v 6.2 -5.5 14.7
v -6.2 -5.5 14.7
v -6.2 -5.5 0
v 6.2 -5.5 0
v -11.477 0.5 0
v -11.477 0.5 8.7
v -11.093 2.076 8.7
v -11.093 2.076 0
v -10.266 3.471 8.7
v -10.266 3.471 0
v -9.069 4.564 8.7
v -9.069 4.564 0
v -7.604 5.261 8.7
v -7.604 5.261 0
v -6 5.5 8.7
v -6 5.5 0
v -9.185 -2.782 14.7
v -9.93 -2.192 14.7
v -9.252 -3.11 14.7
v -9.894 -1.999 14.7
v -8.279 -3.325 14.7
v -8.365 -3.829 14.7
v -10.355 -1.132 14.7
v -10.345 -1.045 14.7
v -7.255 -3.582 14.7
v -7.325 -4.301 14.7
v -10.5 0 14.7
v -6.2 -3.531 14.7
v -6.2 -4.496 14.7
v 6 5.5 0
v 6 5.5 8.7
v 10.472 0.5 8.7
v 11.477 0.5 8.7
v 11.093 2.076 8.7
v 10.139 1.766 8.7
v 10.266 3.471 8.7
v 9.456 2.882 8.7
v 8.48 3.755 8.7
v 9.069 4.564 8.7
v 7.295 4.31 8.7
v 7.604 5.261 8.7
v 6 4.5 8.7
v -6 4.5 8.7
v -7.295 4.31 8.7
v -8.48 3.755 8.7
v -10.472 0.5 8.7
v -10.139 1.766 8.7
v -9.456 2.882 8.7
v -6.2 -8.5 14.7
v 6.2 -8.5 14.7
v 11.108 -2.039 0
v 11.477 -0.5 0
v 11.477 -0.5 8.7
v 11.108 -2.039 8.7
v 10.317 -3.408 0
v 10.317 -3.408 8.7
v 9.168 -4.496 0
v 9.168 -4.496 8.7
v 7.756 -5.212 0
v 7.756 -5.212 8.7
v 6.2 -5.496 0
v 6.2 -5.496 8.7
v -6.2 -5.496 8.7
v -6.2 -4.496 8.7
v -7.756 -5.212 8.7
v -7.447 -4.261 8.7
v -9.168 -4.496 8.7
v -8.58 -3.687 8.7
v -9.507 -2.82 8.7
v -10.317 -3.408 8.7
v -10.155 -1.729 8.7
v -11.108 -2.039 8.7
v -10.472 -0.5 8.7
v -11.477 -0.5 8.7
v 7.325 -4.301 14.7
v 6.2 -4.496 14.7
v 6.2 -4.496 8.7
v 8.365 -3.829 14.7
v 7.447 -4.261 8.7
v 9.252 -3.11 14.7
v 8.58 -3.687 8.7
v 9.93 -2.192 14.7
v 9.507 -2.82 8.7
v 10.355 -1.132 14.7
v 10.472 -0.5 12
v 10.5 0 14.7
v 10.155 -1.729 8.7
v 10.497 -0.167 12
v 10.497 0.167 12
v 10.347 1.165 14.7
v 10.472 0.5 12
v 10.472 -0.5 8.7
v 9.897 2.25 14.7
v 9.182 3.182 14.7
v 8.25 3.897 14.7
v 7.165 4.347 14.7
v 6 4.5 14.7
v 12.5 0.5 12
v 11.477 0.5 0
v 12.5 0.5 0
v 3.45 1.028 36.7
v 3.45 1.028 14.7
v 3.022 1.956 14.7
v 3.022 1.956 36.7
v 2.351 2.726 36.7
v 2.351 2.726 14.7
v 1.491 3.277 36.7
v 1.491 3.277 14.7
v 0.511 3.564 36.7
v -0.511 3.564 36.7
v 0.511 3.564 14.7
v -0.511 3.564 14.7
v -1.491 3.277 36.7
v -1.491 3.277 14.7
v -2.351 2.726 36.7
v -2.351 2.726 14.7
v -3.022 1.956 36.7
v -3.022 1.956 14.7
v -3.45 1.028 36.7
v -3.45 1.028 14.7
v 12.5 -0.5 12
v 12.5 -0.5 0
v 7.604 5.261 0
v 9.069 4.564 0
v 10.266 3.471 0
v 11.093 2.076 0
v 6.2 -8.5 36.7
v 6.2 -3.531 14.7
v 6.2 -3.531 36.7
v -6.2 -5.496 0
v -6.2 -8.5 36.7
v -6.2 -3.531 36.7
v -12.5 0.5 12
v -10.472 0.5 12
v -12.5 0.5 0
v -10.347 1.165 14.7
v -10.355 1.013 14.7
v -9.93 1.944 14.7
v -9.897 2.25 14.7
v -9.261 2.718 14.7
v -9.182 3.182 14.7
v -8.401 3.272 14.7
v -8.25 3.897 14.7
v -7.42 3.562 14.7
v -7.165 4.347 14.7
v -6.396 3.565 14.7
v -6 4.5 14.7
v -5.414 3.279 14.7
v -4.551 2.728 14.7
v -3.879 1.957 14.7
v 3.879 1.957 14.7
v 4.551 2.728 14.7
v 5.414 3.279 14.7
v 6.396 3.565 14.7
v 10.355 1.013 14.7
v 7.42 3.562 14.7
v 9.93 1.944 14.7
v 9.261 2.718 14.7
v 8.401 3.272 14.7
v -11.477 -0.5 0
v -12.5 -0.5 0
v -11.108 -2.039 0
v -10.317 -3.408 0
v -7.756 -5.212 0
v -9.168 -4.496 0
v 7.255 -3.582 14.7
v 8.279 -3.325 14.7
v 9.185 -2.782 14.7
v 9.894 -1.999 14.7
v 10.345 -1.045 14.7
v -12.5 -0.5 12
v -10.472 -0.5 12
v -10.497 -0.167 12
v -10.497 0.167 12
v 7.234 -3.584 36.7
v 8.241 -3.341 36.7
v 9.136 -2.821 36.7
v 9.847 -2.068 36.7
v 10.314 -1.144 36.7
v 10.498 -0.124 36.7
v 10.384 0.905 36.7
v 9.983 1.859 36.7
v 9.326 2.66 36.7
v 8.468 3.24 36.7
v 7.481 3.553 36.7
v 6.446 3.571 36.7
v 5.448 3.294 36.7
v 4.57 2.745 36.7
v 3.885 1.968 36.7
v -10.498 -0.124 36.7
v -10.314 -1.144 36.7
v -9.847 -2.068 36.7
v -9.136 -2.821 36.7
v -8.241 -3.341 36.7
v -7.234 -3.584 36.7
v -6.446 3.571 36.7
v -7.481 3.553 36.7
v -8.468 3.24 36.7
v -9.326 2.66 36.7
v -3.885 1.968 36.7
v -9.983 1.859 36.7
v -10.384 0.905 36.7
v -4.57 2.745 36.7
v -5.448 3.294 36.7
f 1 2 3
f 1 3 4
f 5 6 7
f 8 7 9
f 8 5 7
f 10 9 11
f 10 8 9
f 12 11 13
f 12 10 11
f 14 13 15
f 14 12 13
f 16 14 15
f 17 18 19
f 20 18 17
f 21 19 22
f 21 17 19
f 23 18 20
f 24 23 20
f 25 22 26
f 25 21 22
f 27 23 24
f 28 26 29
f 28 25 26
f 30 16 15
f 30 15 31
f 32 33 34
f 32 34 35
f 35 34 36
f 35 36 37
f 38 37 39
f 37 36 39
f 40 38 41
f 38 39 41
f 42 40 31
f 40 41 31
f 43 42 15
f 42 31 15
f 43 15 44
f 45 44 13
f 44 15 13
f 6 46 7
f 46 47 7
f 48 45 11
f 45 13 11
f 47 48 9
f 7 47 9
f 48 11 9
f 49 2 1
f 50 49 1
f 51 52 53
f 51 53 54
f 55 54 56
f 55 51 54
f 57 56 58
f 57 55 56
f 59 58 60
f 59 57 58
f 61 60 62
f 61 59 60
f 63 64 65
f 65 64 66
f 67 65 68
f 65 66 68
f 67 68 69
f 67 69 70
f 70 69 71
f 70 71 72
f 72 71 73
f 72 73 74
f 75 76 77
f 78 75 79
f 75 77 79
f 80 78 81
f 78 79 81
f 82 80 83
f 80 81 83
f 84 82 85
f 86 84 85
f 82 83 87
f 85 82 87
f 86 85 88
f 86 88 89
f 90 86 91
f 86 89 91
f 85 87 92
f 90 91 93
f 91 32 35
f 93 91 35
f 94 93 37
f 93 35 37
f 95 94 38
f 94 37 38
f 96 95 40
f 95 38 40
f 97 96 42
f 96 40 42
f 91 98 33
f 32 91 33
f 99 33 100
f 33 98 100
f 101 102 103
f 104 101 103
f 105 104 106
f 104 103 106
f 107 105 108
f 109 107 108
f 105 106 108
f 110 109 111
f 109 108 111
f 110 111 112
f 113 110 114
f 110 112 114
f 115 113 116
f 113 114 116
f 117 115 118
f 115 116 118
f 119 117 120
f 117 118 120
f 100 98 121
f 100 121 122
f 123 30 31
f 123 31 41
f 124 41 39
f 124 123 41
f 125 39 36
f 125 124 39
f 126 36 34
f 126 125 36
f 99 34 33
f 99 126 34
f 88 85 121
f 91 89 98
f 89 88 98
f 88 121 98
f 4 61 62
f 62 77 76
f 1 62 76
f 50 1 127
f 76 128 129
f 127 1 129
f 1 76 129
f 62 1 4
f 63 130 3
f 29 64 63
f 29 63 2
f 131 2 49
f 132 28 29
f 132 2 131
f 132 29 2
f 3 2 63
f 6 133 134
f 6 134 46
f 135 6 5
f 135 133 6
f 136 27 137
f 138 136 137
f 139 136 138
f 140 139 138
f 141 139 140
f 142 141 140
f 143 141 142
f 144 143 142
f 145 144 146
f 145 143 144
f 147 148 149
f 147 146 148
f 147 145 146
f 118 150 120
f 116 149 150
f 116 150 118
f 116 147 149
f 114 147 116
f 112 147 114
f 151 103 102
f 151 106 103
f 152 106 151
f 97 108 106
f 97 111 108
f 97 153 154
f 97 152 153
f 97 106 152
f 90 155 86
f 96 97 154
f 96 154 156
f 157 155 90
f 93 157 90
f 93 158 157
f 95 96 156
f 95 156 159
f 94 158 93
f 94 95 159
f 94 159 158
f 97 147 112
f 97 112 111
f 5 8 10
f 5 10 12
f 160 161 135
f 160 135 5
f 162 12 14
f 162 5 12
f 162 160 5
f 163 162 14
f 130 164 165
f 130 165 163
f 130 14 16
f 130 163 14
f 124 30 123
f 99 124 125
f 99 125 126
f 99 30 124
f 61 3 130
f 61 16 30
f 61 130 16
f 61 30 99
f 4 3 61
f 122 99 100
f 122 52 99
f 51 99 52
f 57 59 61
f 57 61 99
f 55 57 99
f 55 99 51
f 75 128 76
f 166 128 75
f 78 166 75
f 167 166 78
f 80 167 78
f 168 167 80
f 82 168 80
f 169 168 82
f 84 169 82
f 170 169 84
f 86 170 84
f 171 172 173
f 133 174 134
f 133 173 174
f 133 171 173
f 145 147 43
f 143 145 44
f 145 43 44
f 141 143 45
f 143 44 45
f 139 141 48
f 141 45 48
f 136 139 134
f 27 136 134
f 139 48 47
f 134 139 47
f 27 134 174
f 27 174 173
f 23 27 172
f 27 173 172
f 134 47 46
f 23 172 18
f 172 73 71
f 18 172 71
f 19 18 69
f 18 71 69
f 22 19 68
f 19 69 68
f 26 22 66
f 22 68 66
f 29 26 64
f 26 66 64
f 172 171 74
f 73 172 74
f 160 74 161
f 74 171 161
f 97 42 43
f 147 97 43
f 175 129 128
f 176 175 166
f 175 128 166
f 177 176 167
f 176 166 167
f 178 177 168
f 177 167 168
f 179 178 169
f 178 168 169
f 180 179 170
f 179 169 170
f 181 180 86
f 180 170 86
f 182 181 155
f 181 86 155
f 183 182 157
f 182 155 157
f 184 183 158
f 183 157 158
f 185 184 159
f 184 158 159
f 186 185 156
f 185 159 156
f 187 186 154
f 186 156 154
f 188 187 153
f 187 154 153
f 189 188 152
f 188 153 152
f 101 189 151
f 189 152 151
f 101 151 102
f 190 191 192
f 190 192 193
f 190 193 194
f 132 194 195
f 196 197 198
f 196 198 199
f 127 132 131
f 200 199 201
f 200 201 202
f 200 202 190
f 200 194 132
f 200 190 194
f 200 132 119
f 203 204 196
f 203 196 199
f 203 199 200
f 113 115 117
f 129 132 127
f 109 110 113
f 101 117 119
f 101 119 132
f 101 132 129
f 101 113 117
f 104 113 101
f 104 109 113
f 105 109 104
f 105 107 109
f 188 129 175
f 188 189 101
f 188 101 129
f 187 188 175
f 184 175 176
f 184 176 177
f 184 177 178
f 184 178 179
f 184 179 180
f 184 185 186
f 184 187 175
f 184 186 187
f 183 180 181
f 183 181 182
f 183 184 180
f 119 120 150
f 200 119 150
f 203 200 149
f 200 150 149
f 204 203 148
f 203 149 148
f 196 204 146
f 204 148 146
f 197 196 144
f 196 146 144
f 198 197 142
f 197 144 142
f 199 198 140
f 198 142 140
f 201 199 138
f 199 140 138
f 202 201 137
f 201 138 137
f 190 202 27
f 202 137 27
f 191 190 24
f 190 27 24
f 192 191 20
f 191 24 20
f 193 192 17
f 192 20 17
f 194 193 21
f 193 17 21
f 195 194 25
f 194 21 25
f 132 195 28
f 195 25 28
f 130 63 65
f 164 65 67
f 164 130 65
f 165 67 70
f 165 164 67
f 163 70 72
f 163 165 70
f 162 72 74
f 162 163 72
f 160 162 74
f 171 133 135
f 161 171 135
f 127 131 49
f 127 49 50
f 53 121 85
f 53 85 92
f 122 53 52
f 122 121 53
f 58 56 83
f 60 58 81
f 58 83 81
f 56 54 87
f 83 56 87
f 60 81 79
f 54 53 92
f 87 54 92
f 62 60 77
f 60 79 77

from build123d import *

# Parameters (mm, degrees)
EXTRUDE_1_DEPTH  = 8.7
EXTRUDE_2_DEPTH  = 6
EXTRUDE_7_DEPTH  = 22
EXTRUDE_15_REACH = 42.002
SKETCH_6_W       = 12.4
SKETCH_6_H       = 36.7
EXTRUDE_16_REACH = 46.194
SKETCH_10_W      = 12
SKETCH_10_H      = 1
SKETCH_11_W      = 12.4
SKETCH_11_H      = 22
EXTRUDE_17_DEPTH = 3


with BuildPart() as part:
    # ｽｹｯﾁ1 → ﾎﾞｽ - 押し出し1 (new body)
    with BuildSketch(Plane.XY):
        with BuildLine():
            Line((-6, 5.5), (6, 5.5))
            ThreePointArc((6, 5.5), (11.5, 0), (6, -5.5))
            Line((6, -5.5), (-6, -5.5))
            ThreePointArc((-6, -5.5), (-11.5, 0), (-6, 5.5))
        make_face()
    extrude(amount=EXTRUDE_1_DEPTH)

    # ｽｹｯﾁ4 → ﾎﾞｽ - 押し出し2 (add)
    with BuildSketch(Plane.XY.offset(8.7)):
        with BuildLine():
            Line((-6, -4.5), (6, -4.5))
            ThreePointArc((6, -4.5), (10.5, 0), (6, 4.5))
            Line((6, 4.5), (-6, 4.5))
            ThreePointArc((-6, 4.5), (-10.5, 0), (-6, -4.5))
        make_face()
    extrude(amount=EXTRUDE_2_DEPTH)

    # ｽｹｯﾁ5 → ﾎﾞｽ - 押し出し7 (add)
    with BuildSketch(Plane.XY.offset(14.7)):
        with BuildLine():
            ThreePointArc((-3.45, 1.02834819), (-10.5, 0), (-3.45, -1.02834819))
            ThreePointArc((-3.45, -1.02834819), (0, -3.6), (3.45, -1.02834819))
            ThreePointArc((3.45, -1.02834819), (10.5, 0), (3.45, 1.02834819))
            ThreePointArc((3.45, 1.02834819), (0, 3.6), (-3.45, 1.02834819))
        make_face()
    extrude(amount=EXTRUDE_7_DEPTH)

    # ｽｹｯﾁ6 → ﾎﾞｽ - 押し出し15 (add, up to next)
    with BuildSketch(Plane.XZ.offset(5.5), mode=Mode.PRIVATE) as extrude_15_sk1:
        with Locations((0, 18.35)):
            Rectangle(SKETCH_6_W, SKETCH_6_H)
    extrude_15_tool1 = extrude(extrude_15_sk1.sketch, amount=-EXTRUDE_15_REACH, mode=Mode.PRIVATE) - part.part
    add(extrude_15_tool1.solids().sort_by_distance((0, -5.5, 18.35))[0])

    # ｽｹｯﾁ10 → ﾎﾞｽ - 押し出し16 (add, up to next)
    with BuildSketch(Plane(origin=(12.5, 0, 0), x_dir=(0, 0, -1), z_dir=(1, 0, 0)), mode=Mode.PRIVATE) as extrude_16_sk1:
        with Locations((-6, 0)):
            Rectangle(SKETCH_10_W, SKETCH_10_H)
    extrude_16_tool1 = extrude(extrude_16_sk1.sketch, amount=-EXTRUDE_16_REACH, mode=Mode.PRIVATE) - part.part
    extrude_16 = extrude_16_tool1.solids().sort_by_distance((12.5, 0, 6))[0]
    add(extrude_16)

    # ﾐﾗｰ1: ﾎﾞｽ - 押し出し16 across plane
    add(extrude_16.mirror(Plane(origin=(0, 0, 0), x_dir=(0, 0, 1), z_dir=(1, 0, 0))))

    # ｽｹｯﾁ11 → ﾎﾞｽ - 押し出し17 (add)
    with BuildSketch(Plane.XZ.offset(5.5)):
        with Locations((0, 25.7)):
            Rectangle(SKETCH_11_W, SKETCH_11_H)
    extrude(amount=EXTRUDE_17_DEPTH)


solid = part.part
